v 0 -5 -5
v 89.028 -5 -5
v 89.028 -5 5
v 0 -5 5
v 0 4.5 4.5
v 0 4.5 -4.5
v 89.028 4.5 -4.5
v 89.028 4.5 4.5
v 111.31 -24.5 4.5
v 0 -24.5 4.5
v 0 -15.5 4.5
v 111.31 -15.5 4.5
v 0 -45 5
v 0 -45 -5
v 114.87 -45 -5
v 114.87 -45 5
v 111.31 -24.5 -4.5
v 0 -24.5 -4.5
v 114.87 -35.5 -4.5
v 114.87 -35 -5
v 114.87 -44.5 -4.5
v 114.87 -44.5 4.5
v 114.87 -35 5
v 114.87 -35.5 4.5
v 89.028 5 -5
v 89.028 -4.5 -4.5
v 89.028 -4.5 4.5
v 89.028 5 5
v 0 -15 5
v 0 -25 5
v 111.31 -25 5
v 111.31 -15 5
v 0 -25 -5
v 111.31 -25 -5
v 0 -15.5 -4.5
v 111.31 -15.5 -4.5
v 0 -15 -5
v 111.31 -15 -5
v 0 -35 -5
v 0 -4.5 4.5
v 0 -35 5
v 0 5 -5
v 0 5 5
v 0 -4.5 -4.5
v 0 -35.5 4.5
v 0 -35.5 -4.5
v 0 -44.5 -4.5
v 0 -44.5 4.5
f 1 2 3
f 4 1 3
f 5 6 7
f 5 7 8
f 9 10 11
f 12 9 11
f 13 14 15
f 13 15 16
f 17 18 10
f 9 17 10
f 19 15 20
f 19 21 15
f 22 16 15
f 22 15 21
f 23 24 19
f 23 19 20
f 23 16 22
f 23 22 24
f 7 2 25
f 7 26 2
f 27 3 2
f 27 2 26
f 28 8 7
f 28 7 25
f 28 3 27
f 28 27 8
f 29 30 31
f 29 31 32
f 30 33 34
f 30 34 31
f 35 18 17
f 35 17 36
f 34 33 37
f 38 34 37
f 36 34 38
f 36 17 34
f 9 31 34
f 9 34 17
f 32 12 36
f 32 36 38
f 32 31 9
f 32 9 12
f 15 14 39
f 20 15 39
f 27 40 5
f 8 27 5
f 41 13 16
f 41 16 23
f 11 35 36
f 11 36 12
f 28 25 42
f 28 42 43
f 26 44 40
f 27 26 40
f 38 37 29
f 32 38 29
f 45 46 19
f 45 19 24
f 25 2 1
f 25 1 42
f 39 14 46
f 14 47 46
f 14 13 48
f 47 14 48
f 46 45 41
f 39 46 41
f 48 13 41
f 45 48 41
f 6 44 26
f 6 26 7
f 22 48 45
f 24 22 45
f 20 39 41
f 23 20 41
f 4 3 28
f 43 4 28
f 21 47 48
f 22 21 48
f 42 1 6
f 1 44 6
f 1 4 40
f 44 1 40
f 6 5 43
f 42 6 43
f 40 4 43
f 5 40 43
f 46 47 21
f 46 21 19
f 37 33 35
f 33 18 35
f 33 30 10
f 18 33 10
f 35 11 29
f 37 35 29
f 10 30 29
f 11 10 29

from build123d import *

# Parameters (mm, degrees)
F1_W     = 10
F1_H     = 10
F1_W_2   = 9
F1_H_2   = 9
F2_DEPTH = 89.028
F3_W     = 10
F3_H     = 10
F3_W_2   = 9
F3_H_2   = 9
F4_DEPTH = 111.31
F5_W     = 10
F5_H     = 10
F5_W_2   = 9
F5_H_2   = 9
F6_DEPTH = 114.87


with BuildPart() as f2:
    # F1 (on Right) → F2 (new body)
    with BuildSketch(Plane.YZ):
        Rectangle(F1_W, F1_H)
        Rectangle(F1_W_2, F1_H_2, mode=Mode.SUBTRACT)
    extrude(amount=F2_DEPTH)


with BuildPart() as f4:
    # F3 (on Right) → F4 (new body)
    with BuildSketch(Plane.YZ):
        with Locations((-20, 0)):
            Rectangle(F3_W, F3_H)
        with Locations((-20, 0)):
            Rectangle(F3_W_2, F3_H_2, mode=Mode.SUBTRACT)
    extrude(amount=F4_DEPTH)


with BuildPart() as f6:
    # F5 (on Right) → F6 (new body)
    with BuildSketch(Plane.YZ):
        with Locations((-40, 0)):
            Rectangle(F5_W, F5_H)
        with Locations((-40, 0)):
            Rectangle(F5_W_2, F5_H_2, mode=Mode.SUBTRACT)
    extrude(amount=F6_DEPTH)


solid = Compound([f2.part, f4.part, f6.part])
